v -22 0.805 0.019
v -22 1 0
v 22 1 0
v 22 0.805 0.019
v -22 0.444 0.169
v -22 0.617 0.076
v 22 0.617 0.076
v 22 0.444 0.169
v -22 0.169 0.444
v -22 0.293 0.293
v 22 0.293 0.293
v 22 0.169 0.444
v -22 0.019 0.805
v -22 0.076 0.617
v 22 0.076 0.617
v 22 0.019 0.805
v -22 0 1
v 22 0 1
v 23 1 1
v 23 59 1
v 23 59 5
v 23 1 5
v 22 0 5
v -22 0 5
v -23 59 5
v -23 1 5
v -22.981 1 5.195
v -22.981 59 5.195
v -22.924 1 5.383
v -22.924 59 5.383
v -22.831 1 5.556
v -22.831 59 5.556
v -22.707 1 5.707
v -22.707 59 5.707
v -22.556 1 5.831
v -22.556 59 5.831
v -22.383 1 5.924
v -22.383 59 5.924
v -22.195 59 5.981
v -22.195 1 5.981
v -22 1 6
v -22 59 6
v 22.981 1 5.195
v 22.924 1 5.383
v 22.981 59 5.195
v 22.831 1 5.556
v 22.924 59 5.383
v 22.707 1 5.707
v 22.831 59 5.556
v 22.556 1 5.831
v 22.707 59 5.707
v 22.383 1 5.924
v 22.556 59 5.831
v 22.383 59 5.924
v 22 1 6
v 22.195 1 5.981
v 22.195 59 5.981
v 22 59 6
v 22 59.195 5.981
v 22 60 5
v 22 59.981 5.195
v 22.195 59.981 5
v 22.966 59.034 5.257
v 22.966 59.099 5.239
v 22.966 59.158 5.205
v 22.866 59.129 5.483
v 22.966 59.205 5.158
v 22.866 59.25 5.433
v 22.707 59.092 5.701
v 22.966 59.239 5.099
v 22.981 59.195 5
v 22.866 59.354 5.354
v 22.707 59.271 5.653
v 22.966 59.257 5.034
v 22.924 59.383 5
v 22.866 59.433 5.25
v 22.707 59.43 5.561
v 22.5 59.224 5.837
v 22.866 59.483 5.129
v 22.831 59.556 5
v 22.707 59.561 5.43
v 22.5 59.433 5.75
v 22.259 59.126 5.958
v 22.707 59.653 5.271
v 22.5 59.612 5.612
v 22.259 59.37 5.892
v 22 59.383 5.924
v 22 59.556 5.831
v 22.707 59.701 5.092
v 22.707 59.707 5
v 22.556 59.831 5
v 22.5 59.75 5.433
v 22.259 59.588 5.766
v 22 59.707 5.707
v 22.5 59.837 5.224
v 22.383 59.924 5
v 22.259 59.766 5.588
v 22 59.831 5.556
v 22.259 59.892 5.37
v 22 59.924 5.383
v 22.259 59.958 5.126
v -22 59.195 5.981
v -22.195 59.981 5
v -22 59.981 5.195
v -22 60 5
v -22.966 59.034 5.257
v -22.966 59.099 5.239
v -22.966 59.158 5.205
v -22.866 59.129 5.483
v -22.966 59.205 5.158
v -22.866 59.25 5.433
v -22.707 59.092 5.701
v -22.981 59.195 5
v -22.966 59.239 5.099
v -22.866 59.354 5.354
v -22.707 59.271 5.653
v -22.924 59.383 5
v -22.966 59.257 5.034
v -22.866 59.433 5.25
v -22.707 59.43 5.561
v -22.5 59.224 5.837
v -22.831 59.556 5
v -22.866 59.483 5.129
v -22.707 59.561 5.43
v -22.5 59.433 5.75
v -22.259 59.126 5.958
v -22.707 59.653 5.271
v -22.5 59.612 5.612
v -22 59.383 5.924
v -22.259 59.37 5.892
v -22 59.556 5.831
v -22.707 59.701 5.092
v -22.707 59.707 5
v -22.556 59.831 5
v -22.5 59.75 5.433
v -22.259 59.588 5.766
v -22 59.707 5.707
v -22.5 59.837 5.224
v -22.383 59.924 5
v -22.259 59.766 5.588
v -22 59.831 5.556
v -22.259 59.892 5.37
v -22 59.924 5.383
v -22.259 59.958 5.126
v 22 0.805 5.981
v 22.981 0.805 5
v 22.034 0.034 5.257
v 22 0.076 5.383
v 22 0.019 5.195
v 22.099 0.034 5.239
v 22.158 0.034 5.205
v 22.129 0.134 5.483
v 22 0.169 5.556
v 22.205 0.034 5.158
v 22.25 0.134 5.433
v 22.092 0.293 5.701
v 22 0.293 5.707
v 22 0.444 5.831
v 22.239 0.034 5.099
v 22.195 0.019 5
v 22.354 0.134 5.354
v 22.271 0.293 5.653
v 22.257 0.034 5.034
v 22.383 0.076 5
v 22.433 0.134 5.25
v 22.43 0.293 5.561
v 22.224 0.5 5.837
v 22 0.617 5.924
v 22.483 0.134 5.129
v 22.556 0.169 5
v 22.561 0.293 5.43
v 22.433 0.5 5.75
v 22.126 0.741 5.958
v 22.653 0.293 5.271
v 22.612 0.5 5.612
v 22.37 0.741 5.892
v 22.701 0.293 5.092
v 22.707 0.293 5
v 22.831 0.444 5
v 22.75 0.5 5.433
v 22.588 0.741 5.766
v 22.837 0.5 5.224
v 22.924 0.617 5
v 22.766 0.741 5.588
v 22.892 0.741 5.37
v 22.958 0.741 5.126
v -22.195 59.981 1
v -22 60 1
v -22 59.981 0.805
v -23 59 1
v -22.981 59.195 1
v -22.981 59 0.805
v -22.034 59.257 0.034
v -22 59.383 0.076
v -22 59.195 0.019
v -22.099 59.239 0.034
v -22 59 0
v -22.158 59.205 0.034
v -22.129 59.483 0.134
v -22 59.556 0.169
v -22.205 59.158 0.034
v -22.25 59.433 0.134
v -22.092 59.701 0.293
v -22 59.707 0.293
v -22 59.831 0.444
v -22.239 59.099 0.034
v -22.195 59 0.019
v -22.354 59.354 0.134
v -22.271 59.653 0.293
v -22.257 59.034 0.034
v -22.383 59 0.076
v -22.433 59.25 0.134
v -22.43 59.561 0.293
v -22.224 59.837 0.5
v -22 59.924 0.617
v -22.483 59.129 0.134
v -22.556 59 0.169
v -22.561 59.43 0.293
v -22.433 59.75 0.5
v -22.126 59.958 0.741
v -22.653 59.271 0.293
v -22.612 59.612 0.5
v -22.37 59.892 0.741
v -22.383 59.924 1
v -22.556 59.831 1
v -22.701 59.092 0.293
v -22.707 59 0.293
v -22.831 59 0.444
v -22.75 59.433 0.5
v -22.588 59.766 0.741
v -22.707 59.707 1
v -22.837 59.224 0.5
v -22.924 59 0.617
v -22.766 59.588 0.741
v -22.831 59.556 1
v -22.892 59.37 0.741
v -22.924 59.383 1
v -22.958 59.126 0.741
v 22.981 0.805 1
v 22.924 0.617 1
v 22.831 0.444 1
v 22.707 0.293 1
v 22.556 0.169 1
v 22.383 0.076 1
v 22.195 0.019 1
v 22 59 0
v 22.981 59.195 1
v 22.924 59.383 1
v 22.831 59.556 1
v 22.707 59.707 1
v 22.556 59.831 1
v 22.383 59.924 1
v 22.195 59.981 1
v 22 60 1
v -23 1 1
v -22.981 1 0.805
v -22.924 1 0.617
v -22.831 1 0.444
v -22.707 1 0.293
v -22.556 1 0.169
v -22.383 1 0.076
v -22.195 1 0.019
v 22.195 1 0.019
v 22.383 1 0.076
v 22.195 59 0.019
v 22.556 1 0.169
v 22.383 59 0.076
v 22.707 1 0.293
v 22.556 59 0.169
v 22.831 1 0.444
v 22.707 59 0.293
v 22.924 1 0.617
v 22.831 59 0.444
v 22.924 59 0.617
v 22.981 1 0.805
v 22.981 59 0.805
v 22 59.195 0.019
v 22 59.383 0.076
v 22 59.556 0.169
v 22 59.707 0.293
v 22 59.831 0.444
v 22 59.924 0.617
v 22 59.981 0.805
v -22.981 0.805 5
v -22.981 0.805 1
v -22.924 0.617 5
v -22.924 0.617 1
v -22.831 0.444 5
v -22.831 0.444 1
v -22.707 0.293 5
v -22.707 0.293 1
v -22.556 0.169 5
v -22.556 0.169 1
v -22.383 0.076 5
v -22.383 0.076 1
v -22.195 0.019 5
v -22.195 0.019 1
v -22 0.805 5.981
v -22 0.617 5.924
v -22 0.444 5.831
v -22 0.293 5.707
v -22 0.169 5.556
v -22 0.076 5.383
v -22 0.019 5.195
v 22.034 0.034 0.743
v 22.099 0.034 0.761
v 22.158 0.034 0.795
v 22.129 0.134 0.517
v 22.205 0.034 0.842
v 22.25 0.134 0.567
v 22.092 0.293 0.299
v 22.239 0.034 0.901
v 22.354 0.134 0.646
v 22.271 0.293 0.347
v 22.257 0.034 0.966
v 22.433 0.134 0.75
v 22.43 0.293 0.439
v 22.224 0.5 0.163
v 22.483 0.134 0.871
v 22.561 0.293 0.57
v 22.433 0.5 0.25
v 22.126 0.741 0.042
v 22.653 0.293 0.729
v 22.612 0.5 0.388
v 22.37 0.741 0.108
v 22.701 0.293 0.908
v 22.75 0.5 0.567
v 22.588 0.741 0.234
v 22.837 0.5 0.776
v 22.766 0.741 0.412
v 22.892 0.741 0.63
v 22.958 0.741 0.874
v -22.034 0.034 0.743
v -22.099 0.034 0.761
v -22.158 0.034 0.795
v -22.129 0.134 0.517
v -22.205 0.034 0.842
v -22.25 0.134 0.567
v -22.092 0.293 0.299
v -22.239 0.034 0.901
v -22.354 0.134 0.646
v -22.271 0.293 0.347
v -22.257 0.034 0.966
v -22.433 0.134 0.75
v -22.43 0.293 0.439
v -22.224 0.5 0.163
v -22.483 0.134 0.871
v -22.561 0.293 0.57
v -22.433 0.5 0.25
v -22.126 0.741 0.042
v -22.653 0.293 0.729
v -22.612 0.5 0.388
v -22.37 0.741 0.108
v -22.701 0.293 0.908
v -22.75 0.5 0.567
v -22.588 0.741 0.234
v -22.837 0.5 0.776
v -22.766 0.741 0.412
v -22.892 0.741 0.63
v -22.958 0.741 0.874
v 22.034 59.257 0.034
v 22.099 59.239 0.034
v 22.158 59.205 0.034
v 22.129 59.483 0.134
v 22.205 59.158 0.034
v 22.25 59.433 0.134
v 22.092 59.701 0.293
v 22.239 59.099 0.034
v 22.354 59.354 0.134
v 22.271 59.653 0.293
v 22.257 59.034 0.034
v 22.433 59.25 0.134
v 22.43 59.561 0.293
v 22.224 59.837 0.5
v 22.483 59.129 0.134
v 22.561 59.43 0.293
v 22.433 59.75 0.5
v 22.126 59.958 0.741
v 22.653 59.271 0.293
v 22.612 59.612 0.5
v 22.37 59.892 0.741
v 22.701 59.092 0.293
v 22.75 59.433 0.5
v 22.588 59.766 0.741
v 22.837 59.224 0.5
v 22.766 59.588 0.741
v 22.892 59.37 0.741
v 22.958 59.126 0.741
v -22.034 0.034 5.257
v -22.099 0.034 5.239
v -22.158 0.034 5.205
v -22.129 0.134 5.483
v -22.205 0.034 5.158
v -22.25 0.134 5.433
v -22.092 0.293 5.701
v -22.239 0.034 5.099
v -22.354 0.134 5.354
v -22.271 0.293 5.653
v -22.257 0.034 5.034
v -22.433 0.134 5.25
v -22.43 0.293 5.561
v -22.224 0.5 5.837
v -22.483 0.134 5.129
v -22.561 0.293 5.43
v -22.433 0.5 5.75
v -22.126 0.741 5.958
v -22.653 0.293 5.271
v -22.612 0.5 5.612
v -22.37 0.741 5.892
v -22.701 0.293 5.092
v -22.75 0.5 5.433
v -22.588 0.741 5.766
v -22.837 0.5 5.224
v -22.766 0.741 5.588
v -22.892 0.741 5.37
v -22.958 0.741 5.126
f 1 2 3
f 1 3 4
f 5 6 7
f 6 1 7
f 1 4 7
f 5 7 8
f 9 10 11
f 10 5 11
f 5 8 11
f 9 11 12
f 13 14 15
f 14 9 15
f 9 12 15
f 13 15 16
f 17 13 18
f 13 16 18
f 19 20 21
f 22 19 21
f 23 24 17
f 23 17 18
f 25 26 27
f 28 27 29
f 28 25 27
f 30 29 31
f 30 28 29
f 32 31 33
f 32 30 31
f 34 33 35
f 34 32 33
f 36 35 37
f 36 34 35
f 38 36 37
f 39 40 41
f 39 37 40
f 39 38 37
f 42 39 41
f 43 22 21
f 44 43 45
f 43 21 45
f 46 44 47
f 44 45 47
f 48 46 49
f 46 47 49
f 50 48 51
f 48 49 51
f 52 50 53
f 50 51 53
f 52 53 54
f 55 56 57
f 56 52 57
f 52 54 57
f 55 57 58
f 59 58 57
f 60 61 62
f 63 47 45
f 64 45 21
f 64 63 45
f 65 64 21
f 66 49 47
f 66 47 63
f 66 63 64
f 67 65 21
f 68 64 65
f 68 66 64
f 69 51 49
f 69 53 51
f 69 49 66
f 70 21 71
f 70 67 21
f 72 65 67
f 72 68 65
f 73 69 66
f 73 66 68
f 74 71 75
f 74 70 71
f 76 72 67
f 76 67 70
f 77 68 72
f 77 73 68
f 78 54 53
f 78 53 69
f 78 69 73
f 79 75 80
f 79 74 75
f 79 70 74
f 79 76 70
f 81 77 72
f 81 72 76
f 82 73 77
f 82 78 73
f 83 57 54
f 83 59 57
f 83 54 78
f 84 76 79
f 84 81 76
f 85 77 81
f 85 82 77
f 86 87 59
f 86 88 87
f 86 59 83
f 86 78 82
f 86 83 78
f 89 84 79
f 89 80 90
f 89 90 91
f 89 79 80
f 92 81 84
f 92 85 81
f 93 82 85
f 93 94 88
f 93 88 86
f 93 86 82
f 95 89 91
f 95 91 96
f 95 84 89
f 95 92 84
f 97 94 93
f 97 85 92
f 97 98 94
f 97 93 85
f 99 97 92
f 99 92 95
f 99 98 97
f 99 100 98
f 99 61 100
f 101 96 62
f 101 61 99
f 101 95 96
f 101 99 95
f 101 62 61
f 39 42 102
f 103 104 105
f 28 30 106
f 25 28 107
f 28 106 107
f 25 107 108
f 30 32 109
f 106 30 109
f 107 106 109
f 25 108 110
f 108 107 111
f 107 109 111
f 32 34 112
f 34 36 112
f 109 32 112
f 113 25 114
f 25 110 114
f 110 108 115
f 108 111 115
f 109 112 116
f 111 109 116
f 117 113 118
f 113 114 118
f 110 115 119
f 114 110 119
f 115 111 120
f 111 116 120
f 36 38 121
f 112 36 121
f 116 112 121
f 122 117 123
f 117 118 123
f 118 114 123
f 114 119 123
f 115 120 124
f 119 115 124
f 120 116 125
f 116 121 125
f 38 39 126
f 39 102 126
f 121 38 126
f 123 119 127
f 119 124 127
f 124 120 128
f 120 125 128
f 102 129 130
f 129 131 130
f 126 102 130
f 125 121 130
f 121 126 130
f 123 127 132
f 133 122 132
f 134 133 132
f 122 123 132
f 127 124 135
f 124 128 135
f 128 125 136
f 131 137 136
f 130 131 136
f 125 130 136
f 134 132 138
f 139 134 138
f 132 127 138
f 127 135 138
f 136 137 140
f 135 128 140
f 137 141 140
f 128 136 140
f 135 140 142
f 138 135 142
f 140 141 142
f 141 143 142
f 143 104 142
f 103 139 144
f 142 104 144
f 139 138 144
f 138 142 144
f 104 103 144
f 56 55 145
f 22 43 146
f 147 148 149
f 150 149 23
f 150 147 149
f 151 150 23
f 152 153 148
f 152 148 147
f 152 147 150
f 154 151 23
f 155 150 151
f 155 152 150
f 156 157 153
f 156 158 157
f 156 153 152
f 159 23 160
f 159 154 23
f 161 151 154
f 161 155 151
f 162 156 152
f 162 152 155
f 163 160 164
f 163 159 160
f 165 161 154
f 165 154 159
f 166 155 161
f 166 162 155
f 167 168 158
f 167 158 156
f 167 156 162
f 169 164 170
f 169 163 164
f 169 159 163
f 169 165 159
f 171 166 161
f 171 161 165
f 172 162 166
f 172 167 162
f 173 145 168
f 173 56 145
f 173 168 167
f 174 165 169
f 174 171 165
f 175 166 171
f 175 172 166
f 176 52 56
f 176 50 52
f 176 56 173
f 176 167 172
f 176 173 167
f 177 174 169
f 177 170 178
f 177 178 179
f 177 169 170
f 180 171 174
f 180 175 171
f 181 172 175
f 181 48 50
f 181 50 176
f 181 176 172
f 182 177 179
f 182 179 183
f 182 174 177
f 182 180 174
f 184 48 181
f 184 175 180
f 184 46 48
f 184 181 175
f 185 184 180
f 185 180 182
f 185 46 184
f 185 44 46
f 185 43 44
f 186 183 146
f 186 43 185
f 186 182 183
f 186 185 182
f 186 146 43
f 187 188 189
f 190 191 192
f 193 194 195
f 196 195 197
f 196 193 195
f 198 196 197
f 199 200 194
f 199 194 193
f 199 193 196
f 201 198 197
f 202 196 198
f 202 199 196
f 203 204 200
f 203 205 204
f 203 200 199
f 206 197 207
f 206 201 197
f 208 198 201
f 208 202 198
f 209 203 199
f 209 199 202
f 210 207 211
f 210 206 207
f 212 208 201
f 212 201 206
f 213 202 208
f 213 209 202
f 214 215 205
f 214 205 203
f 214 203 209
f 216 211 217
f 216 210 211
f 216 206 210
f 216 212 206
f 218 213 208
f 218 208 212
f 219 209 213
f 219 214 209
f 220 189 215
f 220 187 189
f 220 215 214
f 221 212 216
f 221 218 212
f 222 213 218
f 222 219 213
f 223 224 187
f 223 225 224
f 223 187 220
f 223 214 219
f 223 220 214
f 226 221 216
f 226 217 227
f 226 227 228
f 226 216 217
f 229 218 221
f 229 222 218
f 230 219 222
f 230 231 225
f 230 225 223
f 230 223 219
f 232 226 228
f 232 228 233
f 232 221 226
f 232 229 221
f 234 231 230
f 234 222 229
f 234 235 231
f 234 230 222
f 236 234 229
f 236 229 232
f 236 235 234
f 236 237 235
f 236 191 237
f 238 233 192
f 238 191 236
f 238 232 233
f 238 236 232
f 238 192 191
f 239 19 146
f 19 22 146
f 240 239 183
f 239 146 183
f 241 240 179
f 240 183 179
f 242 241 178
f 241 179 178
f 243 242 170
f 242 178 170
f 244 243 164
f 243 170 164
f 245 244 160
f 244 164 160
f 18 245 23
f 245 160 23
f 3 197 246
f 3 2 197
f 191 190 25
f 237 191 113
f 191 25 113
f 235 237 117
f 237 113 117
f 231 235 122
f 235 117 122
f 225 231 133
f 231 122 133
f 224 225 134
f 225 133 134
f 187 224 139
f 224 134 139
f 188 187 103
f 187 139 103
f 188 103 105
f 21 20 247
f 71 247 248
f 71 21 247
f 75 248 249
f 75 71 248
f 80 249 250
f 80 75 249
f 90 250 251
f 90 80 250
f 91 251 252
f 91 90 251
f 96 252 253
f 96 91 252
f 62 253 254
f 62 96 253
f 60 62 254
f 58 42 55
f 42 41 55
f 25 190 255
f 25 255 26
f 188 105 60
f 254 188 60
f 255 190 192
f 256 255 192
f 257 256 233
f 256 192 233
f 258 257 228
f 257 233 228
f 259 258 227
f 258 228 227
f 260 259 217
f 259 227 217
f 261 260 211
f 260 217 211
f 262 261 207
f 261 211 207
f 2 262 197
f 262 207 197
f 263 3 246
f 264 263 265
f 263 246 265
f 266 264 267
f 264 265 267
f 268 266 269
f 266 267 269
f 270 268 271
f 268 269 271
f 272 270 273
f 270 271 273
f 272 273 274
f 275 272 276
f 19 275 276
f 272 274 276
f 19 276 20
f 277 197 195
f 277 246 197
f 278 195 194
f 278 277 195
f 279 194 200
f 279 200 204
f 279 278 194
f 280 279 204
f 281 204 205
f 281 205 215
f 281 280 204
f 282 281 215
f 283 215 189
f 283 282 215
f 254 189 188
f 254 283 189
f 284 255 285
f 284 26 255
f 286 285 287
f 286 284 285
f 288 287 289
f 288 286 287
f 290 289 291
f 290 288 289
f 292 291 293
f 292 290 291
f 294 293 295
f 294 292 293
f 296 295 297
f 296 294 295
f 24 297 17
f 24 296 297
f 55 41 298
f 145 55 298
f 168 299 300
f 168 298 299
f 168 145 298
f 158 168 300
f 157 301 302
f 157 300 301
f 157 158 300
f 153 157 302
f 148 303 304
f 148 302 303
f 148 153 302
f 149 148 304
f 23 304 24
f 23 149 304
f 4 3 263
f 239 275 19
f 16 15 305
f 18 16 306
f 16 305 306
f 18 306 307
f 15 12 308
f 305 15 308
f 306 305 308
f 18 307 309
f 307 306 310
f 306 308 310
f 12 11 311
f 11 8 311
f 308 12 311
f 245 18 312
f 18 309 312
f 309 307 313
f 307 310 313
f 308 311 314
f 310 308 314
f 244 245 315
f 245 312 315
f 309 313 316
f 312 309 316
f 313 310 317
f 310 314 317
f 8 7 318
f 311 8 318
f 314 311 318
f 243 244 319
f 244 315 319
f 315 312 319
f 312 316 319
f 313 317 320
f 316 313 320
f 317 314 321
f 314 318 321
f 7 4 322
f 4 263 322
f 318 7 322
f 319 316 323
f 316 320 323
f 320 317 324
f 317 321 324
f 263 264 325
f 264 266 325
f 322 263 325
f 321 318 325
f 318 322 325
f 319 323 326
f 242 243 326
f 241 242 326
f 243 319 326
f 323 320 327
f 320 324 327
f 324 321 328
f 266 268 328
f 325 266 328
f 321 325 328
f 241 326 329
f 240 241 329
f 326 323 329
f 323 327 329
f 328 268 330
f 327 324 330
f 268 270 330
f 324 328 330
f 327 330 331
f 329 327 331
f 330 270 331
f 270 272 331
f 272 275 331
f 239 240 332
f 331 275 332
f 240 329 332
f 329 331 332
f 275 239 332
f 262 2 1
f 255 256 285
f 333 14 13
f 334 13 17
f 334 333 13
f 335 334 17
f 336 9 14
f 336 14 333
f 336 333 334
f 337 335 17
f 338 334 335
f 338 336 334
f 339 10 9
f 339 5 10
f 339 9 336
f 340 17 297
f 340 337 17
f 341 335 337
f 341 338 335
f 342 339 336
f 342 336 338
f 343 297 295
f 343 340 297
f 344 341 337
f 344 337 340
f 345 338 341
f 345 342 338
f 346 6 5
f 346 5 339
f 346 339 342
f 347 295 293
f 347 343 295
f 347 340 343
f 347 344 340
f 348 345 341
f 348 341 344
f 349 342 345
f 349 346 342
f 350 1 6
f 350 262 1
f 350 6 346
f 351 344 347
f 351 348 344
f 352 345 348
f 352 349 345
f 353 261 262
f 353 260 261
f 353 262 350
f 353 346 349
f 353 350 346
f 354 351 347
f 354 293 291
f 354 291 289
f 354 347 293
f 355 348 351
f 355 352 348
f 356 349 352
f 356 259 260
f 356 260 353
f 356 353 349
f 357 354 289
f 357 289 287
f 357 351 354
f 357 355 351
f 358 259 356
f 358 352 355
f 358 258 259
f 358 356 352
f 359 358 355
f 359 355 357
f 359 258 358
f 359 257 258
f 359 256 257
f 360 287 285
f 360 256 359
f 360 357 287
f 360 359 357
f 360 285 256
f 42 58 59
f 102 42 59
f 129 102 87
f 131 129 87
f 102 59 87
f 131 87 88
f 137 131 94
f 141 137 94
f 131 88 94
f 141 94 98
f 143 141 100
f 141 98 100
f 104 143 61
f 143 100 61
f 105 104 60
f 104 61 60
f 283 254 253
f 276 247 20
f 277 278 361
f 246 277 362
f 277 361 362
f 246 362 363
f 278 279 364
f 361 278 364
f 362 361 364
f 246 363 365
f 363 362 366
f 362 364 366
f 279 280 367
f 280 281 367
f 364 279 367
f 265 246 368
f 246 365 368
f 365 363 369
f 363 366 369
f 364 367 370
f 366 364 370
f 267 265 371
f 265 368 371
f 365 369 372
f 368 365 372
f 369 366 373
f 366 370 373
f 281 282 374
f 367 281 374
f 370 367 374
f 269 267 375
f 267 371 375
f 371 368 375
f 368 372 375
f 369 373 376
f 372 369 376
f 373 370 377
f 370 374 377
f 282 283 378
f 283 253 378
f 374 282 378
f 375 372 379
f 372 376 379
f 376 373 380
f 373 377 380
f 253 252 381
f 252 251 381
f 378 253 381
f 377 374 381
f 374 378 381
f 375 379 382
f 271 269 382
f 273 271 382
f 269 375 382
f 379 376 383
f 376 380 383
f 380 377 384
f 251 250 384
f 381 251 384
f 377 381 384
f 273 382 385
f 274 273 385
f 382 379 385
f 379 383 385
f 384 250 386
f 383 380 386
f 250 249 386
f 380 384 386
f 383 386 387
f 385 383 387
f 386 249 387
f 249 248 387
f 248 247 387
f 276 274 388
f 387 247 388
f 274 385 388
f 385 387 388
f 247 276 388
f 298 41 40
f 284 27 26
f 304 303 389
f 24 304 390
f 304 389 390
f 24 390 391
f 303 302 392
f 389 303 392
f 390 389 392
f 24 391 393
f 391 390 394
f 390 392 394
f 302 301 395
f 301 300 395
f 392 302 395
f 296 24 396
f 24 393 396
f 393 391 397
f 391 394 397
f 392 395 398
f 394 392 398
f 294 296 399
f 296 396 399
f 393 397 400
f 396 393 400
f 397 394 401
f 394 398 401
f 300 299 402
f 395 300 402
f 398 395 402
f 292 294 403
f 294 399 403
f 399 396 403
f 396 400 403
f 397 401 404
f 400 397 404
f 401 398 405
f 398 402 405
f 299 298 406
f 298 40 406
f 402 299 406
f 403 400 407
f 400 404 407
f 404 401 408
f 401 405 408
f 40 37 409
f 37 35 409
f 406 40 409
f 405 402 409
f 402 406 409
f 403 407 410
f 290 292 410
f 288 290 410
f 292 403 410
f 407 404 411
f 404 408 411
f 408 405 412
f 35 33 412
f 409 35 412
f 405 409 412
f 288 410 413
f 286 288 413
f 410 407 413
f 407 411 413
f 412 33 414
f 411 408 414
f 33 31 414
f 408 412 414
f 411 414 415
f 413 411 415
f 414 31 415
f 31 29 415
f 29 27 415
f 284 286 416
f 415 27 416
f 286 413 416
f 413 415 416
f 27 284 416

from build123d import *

# Parameters (mm, degrees)
F0_W     = 46
F0_H     = 6
F1_DEPTH = 60
F2_R     = 1


# Not quite as in the source:
# - a feature names something its author has since deleted; it is built from what else it names


with BuildPart() as f1:
    # F0 (on Front) → F1 (new body)
    with BuildSketch(Plane.XZ):
        with Locations((0, 3)):
            Rectangle(F0_W, F0_H)
    extrude(amount=-F1_DEPTH)

    # F2
    f2_edges = [f1.edges().sort_by_distance(p)[0] for p in [
        (0, 60, 6),
        (23, 30, 6),
        (-23, 30, 6),
        (0, 0, 6),
        (23, 60, 3),
        (-23, 60, 3),
        (0, 60, 0),
        (-23, 30, 0),
        (23, 30, 0),
        (0, 0, 0),
        (-23, 0, 3),
        (23, 0, 3),
    ]]
    fillet(f2_edges, radius=F2_R)


solid = f1.part
